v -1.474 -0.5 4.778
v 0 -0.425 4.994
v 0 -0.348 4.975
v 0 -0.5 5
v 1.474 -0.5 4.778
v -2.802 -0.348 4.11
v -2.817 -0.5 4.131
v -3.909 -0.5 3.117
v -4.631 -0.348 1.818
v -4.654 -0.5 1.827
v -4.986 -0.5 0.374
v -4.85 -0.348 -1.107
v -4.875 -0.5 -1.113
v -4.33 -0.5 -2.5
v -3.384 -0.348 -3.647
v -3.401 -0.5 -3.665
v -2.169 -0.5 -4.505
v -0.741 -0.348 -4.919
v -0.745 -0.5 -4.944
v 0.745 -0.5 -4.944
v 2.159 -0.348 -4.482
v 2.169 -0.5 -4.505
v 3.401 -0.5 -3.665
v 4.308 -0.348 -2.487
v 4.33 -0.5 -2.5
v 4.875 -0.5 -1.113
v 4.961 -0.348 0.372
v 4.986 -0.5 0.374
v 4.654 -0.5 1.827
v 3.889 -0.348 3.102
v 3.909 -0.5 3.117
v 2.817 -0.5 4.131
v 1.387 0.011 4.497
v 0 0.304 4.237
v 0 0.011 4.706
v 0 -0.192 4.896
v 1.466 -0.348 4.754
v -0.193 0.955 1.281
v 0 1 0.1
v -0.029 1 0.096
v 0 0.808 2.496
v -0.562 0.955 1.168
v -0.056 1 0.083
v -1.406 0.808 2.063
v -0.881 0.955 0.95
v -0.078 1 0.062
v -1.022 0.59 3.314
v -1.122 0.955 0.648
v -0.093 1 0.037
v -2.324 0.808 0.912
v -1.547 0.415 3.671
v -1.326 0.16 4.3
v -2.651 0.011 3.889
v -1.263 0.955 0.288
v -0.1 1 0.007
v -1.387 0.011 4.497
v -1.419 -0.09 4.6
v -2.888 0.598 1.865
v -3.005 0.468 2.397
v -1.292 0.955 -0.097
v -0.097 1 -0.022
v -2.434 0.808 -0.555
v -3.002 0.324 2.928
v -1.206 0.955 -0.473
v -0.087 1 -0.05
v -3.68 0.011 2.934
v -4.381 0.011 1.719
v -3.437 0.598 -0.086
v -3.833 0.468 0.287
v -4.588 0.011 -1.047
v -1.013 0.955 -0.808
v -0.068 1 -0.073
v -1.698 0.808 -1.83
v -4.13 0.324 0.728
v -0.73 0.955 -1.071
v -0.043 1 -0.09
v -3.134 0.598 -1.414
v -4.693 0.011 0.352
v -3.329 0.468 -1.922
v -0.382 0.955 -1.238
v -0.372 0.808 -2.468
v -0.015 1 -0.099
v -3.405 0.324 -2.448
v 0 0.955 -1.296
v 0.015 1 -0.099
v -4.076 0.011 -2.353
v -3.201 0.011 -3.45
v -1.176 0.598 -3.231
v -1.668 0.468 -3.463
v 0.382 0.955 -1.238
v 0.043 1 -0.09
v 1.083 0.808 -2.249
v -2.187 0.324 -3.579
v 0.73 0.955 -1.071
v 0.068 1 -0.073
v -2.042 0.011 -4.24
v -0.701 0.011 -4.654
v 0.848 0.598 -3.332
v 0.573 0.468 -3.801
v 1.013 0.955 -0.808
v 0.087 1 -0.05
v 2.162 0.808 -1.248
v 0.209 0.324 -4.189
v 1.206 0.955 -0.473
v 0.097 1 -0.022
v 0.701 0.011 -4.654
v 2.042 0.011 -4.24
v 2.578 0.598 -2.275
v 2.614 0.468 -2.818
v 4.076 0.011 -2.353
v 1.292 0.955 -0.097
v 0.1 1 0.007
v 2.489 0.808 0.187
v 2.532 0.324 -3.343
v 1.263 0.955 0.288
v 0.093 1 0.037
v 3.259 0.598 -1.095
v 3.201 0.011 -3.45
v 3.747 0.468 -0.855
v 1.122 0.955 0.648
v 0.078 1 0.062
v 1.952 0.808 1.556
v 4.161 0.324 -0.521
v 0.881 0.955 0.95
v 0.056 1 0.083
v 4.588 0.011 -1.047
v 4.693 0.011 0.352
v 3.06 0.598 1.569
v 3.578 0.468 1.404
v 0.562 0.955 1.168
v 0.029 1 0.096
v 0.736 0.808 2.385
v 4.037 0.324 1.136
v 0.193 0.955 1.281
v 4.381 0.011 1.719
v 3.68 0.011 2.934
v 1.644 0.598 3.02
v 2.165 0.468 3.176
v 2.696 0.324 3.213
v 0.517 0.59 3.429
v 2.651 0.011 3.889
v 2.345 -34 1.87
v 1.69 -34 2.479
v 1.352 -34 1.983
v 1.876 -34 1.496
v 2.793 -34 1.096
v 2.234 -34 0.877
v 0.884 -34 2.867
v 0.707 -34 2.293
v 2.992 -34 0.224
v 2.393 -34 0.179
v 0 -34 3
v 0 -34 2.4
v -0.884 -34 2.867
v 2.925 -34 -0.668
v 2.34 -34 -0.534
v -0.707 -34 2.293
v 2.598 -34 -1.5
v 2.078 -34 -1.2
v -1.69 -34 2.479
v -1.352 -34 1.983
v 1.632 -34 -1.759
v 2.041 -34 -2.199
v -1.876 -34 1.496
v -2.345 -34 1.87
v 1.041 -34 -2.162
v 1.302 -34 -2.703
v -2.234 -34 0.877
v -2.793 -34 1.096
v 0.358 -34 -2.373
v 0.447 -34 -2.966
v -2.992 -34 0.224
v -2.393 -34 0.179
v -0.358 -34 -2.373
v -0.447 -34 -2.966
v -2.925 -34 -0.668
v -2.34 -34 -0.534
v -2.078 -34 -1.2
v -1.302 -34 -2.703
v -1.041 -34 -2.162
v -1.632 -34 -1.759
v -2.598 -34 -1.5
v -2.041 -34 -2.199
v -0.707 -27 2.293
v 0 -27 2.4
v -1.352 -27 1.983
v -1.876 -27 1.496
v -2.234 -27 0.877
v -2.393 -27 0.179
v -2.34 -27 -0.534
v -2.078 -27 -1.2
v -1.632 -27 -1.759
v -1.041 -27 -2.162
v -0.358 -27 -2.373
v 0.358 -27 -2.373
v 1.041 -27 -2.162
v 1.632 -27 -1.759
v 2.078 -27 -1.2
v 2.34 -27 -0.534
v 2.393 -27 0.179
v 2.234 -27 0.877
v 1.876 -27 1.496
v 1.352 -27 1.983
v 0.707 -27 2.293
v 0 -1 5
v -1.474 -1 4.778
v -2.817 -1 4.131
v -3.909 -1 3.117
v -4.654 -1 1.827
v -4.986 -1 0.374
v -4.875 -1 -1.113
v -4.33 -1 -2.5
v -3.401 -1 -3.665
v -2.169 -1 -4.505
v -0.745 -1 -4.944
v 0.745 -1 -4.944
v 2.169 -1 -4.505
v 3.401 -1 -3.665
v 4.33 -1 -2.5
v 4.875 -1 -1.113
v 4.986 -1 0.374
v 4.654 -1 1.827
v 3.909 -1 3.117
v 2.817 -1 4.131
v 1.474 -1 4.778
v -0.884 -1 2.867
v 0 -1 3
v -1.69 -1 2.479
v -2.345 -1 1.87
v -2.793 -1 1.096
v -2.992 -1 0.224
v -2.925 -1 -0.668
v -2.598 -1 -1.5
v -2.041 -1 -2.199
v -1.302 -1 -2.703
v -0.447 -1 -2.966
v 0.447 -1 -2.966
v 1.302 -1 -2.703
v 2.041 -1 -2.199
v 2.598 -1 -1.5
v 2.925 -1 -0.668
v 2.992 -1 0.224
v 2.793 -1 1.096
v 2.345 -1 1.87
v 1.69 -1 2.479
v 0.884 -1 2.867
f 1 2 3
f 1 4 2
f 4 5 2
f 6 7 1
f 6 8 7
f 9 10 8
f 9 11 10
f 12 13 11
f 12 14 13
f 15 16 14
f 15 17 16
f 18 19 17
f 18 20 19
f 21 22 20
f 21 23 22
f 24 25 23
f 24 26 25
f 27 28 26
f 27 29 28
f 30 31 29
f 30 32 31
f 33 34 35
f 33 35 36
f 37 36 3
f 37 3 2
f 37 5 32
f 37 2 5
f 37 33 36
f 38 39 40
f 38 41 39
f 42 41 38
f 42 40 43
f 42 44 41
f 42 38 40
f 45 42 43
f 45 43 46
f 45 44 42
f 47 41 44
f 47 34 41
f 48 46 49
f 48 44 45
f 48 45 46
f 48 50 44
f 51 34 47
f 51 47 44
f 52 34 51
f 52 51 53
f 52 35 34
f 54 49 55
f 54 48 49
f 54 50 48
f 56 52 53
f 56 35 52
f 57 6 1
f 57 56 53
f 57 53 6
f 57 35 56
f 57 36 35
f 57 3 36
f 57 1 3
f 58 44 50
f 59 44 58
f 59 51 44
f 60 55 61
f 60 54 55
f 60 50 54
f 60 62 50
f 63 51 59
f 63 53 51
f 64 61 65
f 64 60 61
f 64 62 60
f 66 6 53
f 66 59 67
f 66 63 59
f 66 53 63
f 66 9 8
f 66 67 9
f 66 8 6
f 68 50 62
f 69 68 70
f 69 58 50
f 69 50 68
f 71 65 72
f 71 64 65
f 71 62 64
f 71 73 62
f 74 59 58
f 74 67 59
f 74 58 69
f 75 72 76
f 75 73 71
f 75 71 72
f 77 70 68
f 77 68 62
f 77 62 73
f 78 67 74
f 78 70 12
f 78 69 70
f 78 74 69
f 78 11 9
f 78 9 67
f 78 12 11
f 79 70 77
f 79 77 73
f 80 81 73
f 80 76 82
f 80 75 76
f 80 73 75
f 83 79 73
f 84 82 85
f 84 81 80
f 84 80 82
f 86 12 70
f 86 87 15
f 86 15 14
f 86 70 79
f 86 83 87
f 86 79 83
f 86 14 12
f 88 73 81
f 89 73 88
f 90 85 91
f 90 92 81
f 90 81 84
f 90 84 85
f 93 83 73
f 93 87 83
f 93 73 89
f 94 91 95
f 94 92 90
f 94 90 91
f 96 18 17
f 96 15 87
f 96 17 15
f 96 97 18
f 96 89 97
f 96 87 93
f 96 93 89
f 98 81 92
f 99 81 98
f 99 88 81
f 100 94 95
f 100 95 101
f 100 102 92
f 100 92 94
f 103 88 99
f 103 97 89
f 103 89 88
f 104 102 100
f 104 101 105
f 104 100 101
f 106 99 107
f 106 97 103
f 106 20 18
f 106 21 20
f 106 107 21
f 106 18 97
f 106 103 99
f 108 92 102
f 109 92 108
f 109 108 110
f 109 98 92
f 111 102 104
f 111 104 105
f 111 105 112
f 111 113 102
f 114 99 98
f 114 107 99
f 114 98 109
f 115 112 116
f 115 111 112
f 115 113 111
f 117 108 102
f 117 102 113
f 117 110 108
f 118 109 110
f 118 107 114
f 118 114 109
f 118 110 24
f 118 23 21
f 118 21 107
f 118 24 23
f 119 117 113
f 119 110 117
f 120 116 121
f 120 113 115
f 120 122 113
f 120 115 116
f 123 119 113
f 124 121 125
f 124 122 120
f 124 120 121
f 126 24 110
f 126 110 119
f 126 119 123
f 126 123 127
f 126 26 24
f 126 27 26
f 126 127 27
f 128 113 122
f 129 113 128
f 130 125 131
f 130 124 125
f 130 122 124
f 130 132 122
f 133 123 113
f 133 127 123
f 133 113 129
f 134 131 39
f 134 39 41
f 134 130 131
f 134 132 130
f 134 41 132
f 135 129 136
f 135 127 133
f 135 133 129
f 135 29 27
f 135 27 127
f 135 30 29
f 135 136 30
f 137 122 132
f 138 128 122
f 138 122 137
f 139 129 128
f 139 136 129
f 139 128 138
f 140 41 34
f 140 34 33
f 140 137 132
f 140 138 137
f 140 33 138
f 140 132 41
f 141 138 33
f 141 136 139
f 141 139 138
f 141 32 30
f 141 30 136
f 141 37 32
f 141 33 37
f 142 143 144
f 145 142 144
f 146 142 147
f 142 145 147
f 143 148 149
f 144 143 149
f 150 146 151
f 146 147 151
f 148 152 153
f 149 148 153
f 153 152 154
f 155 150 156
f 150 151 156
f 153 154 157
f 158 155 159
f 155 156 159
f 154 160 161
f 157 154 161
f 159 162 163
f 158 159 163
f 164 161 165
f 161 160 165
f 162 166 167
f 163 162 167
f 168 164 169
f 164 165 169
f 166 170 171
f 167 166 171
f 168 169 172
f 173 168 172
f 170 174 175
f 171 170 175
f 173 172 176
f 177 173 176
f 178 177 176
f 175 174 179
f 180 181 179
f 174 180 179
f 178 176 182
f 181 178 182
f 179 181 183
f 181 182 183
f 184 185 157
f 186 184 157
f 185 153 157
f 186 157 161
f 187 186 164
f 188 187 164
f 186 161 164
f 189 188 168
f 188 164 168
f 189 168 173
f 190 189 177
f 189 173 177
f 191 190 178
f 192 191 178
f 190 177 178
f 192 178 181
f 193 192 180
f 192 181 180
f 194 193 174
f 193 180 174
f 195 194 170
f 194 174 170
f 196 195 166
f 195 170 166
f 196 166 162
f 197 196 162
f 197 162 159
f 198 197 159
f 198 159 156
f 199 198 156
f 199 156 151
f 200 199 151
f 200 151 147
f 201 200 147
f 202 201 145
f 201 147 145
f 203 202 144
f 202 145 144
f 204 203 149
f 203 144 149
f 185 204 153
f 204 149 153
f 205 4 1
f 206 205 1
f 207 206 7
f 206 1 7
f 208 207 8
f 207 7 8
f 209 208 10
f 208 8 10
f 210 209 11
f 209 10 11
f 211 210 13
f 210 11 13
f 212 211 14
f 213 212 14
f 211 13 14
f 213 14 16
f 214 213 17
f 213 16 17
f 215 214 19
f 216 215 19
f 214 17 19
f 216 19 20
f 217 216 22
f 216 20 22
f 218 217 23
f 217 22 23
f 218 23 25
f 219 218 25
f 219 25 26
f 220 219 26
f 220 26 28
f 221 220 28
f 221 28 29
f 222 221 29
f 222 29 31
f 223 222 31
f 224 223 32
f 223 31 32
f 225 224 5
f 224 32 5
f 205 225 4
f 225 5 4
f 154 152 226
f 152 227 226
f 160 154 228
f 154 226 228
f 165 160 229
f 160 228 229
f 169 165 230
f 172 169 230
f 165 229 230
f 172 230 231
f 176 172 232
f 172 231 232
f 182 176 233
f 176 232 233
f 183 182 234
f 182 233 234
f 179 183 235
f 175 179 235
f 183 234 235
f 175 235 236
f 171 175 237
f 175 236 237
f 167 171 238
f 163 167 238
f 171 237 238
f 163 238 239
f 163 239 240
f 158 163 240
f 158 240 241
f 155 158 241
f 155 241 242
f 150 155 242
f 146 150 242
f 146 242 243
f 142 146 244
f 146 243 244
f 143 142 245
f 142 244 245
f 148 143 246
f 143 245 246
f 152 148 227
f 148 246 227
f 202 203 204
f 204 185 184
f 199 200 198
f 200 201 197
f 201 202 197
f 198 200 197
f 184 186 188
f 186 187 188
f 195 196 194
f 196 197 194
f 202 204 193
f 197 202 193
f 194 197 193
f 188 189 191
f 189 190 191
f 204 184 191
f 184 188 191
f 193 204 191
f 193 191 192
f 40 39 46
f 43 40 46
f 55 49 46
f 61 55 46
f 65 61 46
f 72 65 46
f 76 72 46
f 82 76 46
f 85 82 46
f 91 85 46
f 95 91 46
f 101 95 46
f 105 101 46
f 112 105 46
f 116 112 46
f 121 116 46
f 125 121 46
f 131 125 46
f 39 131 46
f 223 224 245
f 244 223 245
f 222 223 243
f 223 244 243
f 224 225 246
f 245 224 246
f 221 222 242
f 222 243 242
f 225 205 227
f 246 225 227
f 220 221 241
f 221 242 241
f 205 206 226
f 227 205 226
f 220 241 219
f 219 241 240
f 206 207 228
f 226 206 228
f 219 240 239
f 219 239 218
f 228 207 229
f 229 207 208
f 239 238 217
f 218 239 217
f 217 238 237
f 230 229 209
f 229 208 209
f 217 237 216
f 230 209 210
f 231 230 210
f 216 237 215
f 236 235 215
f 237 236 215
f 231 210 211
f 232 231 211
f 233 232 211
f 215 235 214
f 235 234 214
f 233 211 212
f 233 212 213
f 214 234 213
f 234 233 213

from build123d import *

# Parameters (mm, degrees)
FILLET1_SIZE   = 4.9
FILLET1_SIZE_2 = 1.5


with BuildPart() as part:
    # Sketch1 → Revolve1 (revolve)
    with BuildSketch(Plane(origin=(0, 0, 0), x_dir=(0, 0, -1), z_dir=(1, 0, 0)), mode=Mode.PRIVATE) as revolve1_sk:
        Polygon((3, -1), (0, -1), (0, -27), (2.4, -27), (2.4, -34), (3, -34), align=None)
        Polygon((5, 1), (0, 1), (0, -1), (3, -1), (5, -1), align=None)
    revolve(revolve1_sk.sketch.rotate(Axis((0, 1, 0), (0, -1, 0)), 180), axis=Axis((0, 1, 0), (0, -1, 0)))

    # Fillet1
    # an asymmetric fillet: 4.9, 1.5 mm, written as the material it takes off along each edge
    with BuildSketch(Plane(origin=(0, 1, 0), x_dir=(0, 0, 1), z_dir=(1, 0, 0))) as fillet1_piece_1:
        with BuildLine():
            Bezier((5 - FILLET1_SIZE, 0), (5, 0), (5, FILLET1_SIZE_2), weights=[1, 0.707106781, 1])
            Line((5, FILLET1_SIZE_2), (5, 0))
            Line((5, 0), (5 - FILLET1_SIZE, 0))
        make_face()
    revolve(axis=Axis((0, 1, 0), (0, -1, 0)), mode=Mode.SUBTRACT)


solid = part.part
